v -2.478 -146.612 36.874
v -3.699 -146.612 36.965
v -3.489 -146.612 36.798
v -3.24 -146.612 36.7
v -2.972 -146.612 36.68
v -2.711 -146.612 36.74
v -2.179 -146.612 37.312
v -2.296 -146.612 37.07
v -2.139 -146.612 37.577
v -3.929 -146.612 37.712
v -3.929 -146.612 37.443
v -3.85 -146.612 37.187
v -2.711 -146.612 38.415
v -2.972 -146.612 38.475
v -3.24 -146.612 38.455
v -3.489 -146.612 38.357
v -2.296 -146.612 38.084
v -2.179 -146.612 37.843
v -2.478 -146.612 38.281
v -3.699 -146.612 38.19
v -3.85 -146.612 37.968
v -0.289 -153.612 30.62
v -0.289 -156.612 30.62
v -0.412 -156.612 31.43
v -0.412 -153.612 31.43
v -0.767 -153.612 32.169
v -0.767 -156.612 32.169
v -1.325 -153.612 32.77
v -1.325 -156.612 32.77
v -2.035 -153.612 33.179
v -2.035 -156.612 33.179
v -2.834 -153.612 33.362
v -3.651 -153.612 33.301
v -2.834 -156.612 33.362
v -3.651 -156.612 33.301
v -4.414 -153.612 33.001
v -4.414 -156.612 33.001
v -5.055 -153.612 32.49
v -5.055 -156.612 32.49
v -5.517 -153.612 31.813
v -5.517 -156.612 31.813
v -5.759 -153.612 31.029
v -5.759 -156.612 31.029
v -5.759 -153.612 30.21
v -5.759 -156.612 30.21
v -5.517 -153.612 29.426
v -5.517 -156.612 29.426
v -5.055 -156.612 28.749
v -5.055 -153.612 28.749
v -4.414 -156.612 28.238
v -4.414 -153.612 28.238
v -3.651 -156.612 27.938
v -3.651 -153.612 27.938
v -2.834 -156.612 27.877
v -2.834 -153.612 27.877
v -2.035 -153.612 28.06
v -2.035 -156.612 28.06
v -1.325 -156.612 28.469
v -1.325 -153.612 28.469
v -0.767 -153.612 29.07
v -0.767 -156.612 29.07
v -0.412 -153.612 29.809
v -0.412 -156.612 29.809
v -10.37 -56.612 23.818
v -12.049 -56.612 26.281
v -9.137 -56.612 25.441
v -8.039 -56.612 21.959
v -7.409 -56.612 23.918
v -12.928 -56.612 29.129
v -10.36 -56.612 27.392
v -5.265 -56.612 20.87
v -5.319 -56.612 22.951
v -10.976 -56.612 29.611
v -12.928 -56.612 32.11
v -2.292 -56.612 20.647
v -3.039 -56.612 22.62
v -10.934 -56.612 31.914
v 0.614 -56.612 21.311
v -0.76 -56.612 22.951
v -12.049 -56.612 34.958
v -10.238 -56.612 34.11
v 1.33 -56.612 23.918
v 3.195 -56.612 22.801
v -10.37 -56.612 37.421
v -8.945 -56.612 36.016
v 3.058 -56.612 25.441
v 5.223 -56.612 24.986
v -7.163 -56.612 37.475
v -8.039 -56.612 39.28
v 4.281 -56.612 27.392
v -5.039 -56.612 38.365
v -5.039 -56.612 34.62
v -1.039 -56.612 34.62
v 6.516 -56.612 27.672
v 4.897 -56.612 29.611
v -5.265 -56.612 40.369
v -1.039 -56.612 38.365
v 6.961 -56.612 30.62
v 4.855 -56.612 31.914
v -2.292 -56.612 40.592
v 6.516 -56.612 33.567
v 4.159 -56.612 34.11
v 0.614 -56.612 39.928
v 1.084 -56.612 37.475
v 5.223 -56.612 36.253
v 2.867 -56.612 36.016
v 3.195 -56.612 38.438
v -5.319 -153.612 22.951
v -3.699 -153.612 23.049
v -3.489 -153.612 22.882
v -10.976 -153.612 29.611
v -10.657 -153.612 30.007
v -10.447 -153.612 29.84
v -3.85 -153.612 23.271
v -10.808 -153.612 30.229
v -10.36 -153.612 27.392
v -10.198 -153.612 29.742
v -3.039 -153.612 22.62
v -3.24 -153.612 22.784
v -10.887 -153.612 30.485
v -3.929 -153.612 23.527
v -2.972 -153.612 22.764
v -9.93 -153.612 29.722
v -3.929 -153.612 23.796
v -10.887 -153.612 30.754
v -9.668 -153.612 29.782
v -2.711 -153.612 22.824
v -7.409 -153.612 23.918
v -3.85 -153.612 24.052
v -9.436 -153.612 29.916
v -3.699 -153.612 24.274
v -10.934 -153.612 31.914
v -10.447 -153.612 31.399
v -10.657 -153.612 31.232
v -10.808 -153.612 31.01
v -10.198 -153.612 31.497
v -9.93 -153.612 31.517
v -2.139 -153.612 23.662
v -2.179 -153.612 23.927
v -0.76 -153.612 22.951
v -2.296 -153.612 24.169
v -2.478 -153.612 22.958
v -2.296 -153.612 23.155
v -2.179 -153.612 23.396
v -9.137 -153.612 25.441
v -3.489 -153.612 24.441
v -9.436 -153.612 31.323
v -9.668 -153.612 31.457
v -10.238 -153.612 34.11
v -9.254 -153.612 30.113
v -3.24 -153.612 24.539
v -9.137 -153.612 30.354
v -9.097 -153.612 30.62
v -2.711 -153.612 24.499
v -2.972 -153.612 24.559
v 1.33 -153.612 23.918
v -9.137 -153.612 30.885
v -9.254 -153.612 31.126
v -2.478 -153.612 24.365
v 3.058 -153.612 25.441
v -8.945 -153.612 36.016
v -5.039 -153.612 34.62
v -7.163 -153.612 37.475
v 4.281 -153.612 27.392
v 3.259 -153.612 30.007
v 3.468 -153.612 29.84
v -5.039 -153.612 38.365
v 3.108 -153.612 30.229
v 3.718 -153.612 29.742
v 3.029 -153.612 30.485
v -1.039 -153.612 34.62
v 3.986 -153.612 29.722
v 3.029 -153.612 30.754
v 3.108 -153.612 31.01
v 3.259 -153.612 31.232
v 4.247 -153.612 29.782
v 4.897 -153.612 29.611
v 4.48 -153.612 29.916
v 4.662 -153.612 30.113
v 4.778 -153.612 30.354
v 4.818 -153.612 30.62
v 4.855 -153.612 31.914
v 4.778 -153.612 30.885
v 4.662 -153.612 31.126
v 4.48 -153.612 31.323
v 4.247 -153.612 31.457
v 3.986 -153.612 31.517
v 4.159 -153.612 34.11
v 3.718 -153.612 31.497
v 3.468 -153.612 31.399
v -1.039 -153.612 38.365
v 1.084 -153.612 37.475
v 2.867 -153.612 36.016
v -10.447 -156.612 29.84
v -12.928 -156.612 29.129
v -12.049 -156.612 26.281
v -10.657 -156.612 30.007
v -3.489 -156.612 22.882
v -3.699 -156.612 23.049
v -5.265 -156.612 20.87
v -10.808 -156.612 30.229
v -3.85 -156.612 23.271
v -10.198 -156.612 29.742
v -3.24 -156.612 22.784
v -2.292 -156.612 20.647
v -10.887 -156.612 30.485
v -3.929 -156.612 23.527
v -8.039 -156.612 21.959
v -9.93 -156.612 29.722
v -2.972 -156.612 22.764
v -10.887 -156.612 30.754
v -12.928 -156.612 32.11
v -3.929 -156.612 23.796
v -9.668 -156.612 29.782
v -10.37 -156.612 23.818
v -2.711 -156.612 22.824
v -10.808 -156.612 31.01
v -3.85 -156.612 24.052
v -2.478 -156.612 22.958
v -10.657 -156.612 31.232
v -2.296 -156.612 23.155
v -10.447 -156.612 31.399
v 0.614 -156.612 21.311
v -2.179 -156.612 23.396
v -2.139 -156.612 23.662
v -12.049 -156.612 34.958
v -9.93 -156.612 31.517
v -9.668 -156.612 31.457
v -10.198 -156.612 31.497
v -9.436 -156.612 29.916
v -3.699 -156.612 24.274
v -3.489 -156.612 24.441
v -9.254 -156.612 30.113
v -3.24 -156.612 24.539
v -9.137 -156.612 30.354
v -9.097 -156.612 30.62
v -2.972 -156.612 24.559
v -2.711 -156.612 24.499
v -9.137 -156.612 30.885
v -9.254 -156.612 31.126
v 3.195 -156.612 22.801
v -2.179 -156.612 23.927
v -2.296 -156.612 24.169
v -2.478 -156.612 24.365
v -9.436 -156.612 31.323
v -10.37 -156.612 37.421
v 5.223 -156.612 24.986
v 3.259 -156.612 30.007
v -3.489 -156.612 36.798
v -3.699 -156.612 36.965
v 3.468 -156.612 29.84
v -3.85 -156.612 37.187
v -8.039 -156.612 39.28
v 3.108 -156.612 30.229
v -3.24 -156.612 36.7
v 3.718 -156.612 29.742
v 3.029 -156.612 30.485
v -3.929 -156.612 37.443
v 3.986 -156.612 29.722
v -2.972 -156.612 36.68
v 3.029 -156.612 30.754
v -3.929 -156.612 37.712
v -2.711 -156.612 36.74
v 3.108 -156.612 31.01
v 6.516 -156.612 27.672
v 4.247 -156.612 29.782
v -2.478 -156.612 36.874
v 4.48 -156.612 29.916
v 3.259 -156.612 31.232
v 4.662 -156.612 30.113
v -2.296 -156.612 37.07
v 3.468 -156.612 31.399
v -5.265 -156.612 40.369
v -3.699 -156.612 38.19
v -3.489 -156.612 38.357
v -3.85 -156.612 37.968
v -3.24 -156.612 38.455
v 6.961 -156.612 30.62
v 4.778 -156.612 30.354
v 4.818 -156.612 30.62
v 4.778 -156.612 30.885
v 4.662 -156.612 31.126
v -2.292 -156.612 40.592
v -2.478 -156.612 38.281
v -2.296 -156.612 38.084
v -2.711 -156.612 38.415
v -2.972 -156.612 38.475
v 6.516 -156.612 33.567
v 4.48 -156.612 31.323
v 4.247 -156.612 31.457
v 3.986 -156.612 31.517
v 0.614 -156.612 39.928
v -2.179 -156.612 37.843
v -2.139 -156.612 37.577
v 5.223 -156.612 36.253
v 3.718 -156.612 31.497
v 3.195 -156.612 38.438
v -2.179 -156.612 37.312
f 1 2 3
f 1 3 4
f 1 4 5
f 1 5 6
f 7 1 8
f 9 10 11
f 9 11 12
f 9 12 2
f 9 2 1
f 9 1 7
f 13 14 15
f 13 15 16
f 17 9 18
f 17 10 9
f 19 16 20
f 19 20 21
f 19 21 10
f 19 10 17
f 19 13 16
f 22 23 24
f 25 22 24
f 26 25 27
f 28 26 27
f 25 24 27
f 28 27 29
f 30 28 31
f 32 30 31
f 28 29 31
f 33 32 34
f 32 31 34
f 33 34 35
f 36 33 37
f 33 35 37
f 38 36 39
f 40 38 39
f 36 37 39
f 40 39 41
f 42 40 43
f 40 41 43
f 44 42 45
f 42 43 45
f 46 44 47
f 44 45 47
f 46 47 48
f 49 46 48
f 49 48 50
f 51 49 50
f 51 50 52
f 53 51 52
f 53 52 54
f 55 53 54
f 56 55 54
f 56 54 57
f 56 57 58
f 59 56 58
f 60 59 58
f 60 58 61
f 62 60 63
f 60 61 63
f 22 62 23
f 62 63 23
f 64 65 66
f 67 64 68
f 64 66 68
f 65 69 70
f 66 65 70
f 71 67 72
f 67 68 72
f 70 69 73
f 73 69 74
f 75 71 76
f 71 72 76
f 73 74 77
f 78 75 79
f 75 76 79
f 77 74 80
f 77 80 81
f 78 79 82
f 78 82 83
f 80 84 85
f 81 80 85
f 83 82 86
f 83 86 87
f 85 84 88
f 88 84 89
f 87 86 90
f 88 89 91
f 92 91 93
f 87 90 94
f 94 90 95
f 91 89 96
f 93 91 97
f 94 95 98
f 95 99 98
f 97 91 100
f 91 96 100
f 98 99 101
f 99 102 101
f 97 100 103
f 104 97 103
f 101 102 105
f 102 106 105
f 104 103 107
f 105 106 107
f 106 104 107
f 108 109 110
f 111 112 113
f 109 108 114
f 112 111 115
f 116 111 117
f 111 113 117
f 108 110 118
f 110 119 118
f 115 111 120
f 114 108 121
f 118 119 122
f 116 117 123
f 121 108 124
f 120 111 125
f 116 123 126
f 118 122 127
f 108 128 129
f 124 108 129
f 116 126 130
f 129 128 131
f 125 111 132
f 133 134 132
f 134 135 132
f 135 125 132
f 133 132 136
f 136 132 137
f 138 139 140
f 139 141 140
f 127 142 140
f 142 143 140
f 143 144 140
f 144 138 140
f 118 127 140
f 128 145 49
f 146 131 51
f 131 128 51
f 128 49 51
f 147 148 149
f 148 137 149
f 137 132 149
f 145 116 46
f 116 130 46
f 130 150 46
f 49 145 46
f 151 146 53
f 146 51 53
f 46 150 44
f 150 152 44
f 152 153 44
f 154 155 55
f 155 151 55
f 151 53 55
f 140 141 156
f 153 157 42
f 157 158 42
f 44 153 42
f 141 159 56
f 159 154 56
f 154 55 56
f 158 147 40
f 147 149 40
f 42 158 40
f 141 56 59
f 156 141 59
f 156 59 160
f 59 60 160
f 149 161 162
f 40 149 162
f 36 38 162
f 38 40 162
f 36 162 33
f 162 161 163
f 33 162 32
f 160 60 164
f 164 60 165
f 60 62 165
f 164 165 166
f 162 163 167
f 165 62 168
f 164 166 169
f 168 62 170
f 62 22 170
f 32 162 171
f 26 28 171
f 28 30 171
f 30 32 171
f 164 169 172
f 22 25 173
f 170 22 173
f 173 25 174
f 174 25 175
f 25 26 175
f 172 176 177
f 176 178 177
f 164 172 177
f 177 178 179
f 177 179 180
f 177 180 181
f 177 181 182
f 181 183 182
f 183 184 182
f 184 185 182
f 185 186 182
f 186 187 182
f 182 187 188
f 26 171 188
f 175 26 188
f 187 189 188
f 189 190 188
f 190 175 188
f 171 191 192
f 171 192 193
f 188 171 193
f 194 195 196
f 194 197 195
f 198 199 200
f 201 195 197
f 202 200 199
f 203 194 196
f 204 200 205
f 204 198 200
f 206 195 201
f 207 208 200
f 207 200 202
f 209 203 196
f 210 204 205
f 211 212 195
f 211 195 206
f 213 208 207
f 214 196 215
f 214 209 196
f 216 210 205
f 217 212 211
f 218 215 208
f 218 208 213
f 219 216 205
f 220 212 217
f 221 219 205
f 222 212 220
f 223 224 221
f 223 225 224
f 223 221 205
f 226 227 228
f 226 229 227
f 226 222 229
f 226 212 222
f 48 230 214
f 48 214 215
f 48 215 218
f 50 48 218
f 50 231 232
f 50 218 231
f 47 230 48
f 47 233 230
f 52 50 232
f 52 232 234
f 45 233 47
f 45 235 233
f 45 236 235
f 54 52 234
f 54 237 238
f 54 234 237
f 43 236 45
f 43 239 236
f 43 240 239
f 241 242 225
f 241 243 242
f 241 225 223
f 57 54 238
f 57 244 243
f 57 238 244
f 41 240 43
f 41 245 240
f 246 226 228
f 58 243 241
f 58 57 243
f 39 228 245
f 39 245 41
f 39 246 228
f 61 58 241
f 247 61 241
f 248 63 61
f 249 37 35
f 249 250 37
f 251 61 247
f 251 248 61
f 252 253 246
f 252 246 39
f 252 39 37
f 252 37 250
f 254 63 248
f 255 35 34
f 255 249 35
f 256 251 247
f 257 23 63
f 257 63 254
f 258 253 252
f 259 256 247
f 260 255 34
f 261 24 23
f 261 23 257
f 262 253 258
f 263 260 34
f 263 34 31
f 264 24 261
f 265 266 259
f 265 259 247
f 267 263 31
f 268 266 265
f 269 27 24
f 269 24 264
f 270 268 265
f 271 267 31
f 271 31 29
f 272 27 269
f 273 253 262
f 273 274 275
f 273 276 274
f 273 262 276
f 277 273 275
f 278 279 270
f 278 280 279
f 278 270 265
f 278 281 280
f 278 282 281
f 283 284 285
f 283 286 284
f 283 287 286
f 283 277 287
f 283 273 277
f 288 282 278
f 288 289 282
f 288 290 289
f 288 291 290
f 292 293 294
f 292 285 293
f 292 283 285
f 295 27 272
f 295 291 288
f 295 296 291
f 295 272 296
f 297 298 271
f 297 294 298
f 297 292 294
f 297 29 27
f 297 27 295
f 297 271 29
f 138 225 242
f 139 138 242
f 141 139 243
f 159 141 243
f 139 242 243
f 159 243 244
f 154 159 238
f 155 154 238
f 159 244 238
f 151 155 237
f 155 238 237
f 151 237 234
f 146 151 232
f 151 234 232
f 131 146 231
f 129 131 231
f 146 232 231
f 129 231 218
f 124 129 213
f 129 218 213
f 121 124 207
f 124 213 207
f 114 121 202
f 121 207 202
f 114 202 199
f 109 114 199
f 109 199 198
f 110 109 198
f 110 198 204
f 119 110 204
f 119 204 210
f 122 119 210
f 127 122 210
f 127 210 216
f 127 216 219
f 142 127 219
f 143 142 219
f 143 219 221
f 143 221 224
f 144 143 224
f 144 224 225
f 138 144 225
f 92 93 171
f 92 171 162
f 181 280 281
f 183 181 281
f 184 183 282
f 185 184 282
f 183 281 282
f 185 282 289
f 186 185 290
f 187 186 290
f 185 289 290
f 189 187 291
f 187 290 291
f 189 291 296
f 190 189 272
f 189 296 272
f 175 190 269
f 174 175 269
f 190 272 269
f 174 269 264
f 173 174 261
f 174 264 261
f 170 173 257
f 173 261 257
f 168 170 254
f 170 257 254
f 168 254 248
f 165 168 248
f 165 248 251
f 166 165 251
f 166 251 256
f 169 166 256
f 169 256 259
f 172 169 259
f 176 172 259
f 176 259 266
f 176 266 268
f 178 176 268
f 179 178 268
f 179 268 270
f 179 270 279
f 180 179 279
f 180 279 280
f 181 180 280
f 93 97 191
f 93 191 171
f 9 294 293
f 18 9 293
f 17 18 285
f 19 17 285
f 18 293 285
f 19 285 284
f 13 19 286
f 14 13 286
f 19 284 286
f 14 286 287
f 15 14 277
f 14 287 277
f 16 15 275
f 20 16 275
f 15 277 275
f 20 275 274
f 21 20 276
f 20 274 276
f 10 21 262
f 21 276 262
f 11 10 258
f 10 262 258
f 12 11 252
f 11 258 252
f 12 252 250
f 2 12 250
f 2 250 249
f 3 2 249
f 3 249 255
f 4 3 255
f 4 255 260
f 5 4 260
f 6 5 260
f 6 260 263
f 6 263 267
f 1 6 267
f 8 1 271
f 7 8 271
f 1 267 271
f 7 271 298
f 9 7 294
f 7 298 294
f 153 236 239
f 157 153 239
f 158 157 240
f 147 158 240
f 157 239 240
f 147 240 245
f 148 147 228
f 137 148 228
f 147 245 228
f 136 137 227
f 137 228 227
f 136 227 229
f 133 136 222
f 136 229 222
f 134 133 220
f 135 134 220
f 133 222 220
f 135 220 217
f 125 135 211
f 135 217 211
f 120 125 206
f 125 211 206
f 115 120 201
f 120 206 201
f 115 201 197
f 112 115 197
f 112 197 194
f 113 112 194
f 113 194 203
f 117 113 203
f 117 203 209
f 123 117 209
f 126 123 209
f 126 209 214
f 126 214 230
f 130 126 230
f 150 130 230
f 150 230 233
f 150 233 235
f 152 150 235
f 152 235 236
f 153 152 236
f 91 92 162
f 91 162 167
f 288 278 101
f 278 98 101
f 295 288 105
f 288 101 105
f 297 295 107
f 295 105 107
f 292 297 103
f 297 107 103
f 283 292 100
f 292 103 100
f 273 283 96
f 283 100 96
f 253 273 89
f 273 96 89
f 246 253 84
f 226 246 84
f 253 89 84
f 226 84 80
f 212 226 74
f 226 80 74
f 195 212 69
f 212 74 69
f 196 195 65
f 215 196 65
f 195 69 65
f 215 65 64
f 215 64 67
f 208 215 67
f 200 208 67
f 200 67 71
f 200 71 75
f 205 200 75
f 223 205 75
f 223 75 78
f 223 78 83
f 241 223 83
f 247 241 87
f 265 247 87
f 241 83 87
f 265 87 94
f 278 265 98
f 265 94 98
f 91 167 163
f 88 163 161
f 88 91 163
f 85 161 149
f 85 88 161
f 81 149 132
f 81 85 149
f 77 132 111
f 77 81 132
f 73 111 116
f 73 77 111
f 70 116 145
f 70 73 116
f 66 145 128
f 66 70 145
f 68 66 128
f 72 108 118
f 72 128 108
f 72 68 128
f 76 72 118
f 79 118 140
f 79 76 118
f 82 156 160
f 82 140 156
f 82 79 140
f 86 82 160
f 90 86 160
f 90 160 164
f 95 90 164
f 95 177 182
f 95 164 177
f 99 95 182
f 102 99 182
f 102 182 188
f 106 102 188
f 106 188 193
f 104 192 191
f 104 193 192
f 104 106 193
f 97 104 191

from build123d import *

# Parameters (mm, degrees)
CROQUIS1_R              = 10
SALIENTE_EXTRUIR1_DEPTH = 100
CROQUIS2_R              = 10
CROQUIS2_R_2            = 2.75
SALIENTE_EXTRUIR2_DEPTH = 3
CROQUIS3_R              = 0.9
CORTAR_EXTRUIR1_DEPTH   = 10


with BuildPart() as part:
    # Croquis1 → Saliente-Extruir1 (new body)
    with BuildSketch(Plane.XZ.offset(56.611885127)):
        with Locations((-3.039414363, 30.619510909)):
            Circle(CROQUIS1_R)
        with BuildLine():
            Line((-1.039414363, 38.365477601), (-1.039414363, 34.619510909))
            Line((-1.039414363, 34.619510909), (-5.039414363, 34.619510909))
            Line((-5.039414363, 34.619510909), (-5.039414363, 38.365477601))
            ThreePointArc((-5.039414363, 38.365477601), (-3.039414363, 22.619510909), (-1.039414363, 38.365477601))
        make_face(mode=Mode.SUBTRACT)
    extrude(amount=SALIENTE_EXTRUIR1_DEPTH)

    # Croquis2 → Saliente-Extruir2 (add)
    with BuildSketch(Plane.XZ.offset(156.611885127)):
        with Locations((-3.039414363, 30.619510909)):
            Circle(CROQUIS2_R)
        with Locations((-3.039414363, 30.619510909)):
            Circle(CROQUIS2_R_2, mode=Mode.SUBTRACT)
    extrude(amount=-SALIENTE_EXTRUIR2_DEPTH)

    # Croquis3 → Cortar-Extruir1 (cut)
    with BuildSketch(Plane.XZ.offset(156.611885127)):
        with Locations((-3.039414363, 37.577400418)):
            Circle(CROQUIS3_R)
        with Locations((3.918475146, 30.619510909)):
            Circle(CROQUIS3_R)
        with Locations((-3.039414363, 23.6616214)):
            Circle(CROQUIS3_R)
        with Locations((-9.997303872, 30.619510909)):
            Circle(CROQUIS3_R)
    extrude(amount=-CORTAR_EXTRUIR1_DEPTH, mode=Mode.SUBTRACT)


solid = part.part
